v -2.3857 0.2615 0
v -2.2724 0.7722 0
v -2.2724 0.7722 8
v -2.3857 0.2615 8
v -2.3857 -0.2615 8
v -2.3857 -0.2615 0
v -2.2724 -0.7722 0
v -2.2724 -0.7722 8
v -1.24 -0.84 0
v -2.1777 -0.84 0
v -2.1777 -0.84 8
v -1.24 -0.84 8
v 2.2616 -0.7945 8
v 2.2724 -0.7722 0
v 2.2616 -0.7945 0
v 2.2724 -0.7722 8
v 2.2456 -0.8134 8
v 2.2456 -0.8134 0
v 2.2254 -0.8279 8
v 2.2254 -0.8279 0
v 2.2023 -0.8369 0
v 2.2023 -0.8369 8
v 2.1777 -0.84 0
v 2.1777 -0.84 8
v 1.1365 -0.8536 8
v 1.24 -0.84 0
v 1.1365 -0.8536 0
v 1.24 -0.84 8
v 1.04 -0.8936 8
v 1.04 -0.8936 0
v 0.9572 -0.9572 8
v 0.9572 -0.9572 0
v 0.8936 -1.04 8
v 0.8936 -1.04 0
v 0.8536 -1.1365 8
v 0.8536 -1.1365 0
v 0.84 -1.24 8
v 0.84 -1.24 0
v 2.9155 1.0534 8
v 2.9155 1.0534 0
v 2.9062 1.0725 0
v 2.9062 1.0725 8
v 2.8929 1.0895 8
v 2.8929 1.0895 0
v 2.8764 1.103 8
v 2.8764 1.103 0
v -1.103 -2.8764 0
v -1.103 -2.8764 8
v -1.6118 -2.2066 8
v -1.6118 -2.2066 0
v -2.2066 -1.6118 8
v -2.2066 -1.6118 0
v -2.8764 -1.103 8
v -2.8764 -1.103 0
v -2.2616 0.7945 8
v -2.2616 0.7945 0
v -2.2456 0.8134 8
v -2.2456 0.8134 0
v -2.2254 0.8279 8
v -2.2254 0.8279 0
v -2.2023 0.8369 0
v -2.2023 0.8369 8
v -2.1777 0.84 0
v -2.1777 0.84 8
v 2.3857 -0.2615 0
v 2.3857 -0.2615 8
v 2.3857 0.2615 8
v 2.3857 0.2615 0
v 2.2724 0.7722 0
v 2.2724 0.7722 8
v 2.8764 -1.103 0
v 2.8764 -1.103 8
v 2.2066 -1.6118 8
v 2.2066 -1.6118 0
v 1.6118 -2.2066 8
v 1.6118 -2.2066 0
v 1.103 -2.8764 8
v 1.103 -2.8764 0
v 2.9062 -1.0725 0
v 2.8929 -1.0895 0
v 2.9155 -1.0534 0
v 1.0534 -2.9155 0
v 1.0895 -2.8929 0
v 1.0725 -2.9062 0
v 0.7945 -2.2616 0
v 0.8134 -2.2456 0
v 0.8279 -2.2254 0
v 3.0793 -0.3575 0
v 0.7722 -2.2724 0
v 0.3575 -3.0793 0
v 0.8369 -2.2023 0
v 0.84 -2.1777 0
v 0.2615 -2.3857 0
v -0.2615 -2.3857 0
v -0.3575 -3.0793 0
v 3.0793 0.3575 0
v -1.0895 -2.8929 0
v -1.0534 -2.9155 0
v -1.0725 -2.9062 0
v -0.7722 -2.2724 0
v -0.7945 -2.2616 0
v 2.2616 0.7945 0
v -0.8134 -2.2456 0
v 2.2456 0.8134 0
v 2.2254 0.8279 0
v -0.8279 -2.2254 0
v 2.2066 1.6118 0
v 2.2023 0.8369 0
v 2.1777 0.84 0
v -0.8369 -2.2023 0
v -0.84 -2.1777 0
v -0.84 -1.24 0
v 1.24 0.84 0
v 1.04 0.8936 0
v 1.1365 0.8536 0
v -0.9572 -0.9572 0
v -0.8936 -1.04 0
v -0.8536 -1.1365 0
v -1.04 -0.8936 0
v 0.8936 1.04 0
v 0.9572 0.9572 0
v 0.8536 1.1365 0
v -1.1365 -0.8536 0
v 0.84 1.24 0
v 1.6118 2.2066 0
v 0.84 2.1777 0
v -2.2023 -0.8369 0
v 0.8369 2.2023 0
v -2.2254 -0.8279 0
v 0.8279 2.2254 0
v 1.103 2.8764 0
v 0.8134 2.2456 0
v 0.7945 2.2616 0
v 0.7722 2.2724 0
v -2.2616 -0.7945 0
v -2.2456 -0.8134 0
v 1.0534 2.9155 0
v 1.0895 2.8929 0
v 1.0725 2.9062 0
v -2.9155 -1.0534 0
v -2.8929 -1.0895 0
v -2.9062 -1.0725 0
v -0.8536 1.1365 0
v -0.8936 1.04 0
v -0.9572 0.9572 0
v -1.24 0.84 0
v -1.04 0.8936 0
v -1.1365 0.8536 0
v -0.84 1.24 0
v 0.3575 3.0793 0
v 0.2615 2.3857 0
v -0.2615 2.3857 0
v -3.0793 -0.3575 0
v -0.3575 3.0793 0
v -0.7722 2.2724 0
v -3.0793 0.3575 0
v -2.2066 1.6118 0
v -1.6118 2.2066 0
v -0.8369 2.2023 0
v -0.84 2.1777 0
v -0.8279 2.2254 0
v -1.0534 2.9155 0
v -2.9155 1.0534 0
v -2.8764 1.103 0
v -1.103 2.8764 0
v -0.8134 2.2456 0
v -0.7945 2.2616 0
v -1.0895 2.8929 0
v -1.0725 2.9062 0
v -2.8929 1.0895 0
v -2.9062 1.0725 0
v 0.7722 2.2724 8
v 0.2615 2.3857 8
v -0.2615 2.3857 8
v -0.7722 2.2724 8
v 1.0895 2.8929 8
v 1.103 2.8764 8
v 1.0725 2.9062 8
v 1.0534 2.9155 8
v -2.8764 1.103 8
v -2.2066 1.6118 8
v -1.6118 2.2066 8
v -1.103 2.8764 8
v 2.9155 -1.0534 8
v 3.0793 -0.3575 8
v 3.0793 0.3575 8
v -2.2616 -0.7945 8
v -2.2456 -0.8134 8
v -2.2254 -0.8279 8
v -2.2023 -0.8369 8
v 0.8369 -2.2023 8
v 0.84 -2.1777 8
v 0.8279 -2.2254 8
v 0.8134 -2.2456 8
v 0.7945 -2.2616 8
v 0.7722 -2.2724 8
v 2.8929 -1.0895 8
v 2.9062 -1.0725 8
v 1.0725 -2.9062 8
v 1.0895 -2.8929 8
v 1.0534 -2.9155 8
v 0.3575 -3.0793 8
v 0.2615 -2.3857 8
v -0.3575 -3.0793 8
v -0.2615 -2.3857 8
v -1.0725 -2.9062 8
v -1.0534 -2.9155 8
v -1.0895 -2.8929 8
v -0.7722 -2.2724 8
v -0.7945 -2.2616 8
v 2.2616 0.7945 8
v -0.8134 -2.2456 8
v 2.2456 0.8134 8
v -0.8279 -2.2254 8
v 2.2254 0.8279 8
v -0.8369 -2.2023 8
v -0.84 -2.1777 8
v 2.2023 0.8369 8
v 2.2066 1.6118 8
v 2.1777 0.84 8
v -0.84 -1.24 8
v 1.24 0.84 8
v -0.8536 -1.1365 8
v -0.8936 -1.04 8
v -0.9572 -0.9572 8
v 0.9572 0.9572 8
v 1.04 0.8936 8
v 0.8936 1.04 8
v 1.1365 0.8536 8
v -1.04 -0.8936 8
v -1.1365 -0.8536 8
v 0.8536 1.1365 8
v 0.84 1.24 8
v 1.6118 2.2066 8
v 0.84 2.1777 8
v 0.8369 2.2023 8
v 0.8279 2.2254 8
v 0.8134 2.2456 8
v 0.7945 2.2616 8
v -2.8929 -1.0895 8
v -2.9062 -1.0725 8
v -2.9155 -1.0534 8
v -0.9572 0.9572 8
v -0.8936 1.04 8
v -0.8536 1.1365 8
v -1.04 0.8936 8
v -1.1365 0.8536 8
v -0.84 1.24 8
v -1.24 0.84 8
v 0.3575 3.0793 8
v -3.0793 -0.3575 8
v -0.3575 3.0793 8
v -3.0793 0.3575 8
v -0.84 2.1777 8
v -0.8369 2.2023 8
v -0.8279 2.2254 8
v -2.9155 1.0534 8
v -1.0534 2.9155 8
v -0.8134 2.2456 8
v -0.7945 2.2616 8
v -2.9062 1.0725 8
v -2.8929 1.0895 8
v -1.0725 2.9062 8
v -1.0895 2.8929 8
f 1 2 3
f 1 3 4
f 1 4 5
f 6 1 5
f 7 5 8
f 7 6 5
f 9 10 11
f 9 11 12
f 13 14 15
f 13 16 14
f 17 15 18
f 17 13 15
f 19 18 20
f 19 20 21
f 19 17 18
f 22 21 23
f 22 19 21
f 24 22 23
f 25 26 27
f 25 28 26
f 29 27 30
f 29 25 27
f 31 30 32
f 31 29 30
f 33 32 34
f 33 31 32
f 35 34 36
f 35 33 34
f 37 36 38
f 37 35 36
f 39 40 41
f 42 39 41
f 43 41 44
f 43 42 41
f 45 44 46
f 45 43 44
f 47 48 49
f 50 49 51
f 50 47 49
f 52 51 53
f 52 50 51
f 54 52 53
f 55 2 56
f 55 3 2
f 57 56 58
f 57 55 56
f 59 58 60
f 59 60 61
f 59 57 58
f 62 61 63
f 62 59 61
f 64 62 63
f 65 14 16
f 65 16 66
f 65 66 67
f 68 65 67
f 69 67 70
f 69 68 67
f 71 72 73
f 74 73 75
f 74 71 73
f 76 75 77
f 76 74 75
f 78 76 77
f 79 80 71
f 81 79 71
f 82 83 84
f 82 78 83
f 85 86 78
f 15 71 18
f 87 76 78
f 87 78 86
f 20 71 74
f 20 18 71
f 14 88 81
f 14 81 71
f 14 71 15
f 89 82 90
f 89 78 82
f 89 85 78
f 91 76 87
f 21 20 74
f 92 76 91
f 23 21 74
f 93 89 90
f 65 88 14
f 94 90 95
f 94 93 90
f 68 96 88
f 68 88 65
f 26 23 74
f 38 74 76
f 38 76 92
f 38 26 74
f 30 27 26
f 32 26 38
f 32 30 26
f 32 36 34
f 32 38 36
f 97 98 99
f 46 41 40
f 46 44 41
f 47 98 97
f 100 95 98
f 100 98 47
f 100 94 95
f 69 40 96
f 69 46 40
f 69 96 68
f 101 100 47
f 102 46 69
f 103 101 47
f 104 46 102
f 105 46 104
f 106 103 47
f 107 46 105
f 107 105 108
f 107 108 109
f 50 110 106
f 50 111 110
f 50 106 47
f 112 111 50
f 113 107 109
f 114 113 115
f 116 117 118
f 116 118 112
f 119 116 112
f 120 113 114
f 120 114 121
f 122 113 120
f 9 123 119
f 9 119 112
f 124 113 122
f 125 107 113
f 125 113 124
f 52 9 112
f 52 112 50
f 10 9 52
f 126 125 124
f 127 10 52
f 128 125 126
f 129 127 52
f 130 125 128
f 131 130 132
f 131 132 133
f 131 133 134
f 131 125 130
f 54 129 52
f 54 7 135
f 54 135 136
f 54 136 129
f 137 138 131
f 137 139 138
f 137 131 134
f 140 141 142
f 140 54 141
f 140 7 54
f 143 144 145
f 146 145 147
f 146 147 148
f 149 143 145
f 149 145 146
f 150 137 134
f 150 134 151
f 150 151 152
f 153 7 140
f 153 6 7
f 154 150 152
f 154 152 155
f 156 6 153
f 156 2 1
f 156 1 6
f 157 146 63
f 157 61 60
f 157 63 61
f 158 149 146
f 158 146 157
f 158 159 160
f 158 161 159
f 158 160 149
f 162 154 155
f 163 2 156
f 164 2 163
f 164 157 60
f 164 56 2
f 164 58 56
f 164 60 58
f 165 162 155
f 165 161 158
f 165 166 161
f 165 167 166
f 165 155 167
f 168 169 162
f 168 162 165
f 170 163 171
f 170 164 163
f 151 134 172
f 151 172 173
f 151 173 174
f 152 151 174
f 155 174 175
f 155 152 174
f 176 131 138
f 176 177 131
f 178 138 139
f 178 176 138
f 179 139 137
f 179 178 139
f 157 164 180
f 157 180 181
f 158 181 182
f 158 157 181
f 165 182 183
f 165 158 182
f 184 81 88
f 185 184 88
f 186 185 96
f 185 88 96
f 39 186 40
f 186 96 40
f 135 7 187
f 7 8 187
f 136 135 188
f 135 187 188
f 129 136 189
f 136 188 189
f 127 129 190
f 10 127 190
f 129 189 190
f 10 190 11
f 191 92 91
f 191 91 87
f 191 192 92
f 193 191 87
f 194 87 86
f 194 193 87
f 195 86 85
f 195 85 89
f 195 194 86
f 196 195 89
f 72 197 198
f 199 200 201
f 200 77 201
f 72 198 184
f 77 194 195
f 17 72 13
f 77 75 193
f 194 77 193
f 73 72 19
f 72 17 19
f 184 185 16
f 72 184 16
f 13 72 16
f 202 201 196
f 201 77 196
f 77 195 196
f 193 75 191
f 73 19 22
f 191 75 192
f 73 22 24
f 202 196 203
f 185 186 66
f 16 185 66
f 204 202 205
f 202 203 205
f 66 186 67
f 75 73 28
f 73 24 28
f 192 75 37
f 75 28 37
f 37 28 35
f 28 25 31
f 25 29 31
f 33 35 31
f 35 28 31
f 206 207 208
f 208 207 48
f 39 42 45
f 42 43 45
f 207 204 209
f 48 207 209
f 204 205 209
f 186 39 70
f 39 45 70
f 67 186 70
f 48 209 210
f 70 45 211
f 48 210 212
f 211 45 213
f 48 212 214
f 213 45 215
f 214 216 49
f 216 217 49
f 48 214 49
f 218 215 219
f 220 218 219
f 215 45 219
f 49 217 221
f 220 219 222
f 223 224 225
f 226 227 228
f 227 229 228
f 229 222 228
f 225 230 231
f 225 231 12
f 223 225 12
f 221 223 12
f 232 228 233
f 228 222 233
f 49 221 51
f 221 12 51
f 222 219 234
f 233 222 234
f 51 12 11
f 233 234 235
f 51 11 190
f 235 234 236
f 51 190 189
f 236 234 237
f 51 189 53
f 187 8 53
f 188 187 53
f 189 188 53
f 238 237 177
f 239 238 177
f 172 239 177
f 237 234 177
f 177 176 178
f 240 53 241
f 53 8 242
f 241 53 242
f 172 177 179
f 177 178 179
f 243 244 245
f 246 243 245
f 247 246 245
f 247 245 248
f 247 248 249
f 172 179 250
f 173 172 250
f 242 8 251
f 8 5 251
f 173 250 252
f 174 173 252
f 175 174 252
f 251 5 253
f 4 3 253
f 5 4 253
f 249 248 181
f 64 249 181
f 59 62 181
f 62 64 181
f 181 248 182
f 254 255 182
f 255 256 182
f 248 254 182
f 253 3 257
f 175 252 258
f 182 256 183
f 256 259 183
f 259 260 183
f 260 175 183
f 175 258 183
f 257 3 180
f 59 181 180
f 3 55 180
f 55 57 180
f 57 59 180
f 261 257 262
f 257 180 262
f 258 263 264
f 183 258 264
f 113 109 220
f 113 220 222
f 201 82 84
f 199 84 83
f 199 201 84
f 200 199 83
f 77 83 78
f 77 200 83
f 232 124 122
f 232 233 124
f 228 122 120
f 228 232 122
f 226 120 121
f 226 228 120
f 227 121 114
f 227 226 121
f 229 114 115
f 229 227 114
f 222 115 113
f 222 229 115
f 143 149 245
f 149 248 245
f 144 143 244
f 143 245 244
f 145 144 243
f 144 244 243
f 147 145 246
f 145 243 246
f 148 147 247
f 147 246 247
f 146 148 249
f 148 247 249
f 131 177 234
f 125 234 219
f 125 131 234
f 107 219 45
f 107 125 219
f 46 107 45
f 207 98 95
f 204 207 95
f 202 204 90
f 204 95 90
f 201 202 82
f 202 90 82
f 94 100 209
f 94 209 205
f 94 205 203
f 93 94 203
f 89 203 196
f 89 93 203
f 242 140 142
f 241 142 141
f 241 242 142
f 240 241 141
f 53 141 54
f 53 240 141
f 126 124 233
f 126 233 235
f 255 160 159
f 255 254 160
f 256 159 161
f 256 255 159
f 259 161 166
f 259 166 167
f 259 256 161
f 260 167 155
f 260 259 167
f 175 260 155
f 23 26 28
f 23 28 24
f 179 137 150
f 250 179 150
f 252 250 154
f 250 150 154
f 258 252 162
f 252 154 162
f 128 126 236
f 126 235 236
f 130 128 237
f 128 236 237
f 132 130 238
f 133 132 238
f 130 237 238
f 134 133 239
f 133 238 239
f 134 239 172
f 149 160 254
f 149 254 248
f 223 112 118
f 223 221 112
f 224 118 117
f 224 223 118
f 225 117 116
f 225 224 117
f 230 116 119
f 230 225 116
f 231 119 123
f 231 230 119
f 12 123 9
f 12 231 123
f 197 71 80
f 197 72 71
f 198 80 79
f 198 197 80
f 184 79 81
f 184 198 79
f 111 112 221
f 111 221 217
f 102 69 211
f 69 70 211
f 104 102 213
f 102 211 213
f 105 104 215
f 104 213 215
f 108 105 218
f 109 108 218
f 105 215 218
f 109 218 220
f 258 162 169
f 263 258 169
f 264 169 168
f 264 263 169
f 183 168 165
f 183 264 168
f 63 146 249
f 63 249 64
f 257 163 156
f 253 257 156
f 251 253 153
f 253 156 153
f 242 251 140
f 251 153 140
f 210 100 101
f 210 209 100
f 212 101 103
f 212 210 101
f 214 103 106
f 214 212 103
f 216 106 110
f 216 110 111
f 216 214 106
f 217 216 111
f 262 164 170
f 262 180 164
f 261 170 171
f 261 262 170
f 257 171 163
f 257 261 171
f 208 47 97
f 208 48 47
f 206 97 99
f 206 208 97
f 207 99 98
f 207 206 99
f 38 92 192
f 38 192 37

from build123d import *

# Parameters (mm, degrees)
BOSS_EXTRUDE1_DEPTH = 8
CUT_EXTRUDE1_DEPTH  = 8
FILLET1_R           = 0.4
FILLET2_R           = 0.4
FILLET3_R           = 0.4
FILLET4_R           = 0.4
FILLET5_R           = 6.2
FILLET6_R           = 6.2
FILLET7_R           = 6.2
FILLET8_R           = 6.2
FILLET9_R           = 0.1
FILLET10_R          = 0.1
FILLET11_R          = 0.1
FILLET12_R          = 0.1
FILLET13_R          = 0.1
FILLET14_R          = 0.1
FILLET15_R          = 0.1
FILLET16_R          = 0.1
FILLET17_R          = 0.1
FILLET18_R          = 0.1
FILLET19_R          = 0.1
FILLET20_R          = 0.1
FILLET21_R          = 0.1
FILLET22_R          = 0.1
FILLET23_R          = 0.1
FILLET24_R          = 0.1


with BuildPart() as part:
    # Sketch1 → Boss-Extrude1 (new body)
    with BuildSketch(Plane.XY):
        with BuildLine():
            Line((-1.085, -1.085), (-1.085, -2.903924069))
            ThreePointArc((-1.085, -2.903924069), (0, -3.1), (1.085, -2.903924069))
            Line((1.085, -2.903924069), (1.085, -1.085))
            Line((1.085, -1.085), (2.903924069, -1.085))
            ThreePointArc((2.903924069, -1.085), (3.1, 0), (2.903924069, 1.085))
            Line((2.903924069, 1.085), (1.085, 1.085))
            Line((1.085, 1.085), (1.085, 2.903924069))
            ThreePointArc((1.085, 2.903924069), (0, 3.1), (-1.085, 2.903924069))
            Line((-1.085, 2.903924069), (-1.085, 1.085))
            Line((-1.085, 1.085), (-2.903924069, 1.085))
            ThreePointArc((-2.903924069, 1.085), (-3.1, 0), (-2.903924069, -1.085))
            Line((-2.903924069, -1.085), (-1.085, -1.085))
        make_face()
    extrude(amount=BOSS_EXTRUDE1_DEPTH)

    # Sketch2 → Cut-Extrude1 (cut)
    with BuildSketch(Plane.XY):
        with BuildLine():
            Line((0.84, -0.84), (2.248199279, -0.84))
            ThreePointArc((2.248199279, -0.84), (2.4, 0), (2.248199279, 0.84))
            Line((2.248199279, 0.84), (0.84, 0.84))
            Line((0.84, 0.84), (0.84, 2.248199279))
            ThreePointArc((0.84, 2.248199279), (0, 2.4), (-0.84, 2.248199279))
            Line((-0.84, 2.248199279), (-0.84, 0.84))
            Line((-0.84, 0.84), (-2.248199279, 0.84))
            ThreePointArc((-2.248199279, 0.84), (-2.4, 0), (-2.248199279, -0.84))
            Line((-2.248199279, -0.84), (-0.84, -0.84))
            Line((-0.84, -0.84), (-0.84, -2.248199279))
            ThreePointArc((-0.84, -2.248199279), (0, -2.4), (0.84, -2.248199279))
            Line((0.84, -2.248199279), (0.84, -0.84))
        make_face()
    extrude(amount=CUT_EXTRUDE1_DEPTH, mode=Mode.SUBTRACT)

    # Fillet1
    fillet1_edges = [part.edges().sort_by_distance(p)[0] for p in [
        (-0.84, 0.84, 4),
    ]]
    fillet(fillet1_edges, radius=FILLET1_R)

    # Fillet2
    fillet2_edges = [part.edges().sort_by_distance(p)[0] for p in [
        (0.84, 0.84, 4),
    ]]
    fillet(fillet2_edges, radius=FILLET2_R)

    # Fillet3
    fillet3_edges = [part.edges().sort_by_distance(p)[0] for p in [
        (0.84, -0.84, 4),
    ]]
    fillet(fillet3_edges, radius=FILLET3_R)

    # Fillet4
    fillet4_edges = [part.edges().sort_by_distance(p)[0] for p in [
        (-0.84, -0.84, 4),
    ]]
    fillet(fillet4_edges, radius=FILLET4_R)

    # Fillet5
    # the kernel refuses this fillet: 6.2 mm, written as the material it adds along each edge
    with BuildSketch(Plane(origin=(-1.085, 1.085, 0), x_dir=(-1, 0, 0), z_dir=(0, 0, 1))) as fillet5_piece_1:
        with BuildLine():
            CenterArc((5.198154004, -5.198154004), FILLET5_R, 123.027198012, 23.945603977)
            Line((0, -1.818924069), (0, 0))
            Line((0, 0), (1.818924069, 0))
        make_face()
    extrude(amount=8)

    # Fillet6
    # the kernel refuses this fillet: 6.2 mm, written as the material it adds along each edge
    with BuildSketch(Plane(origin=(-1.085, -1.085, 0), x_dir=(-1, 0, 0), z_dir=(0, 0, 1))) as fillet6_piece_1:
        with BuildLine():
            CenterArc((5.198154004, 5.198154004), FILLET6_R, 213.027198012, 23.945603977)
            Line((0, 1.818924069), (0, 0))
            Line((0, 0), (1.818924069, 0))
        make_face()
    extrude(amount=8)

    # Fillet7
    # the kernel refuses this fillet: 6.2 mm, written as the material it adds along each edge
    with BuildSketch(Plane(origin=(1.085, -1.085, 0), x_dir=(0, -1, 0), z_dir=(0, 0, 1))) as fillet7_piece_1:
        with BuildLine():
            CenterArc((5.198154004, 5.198154004), FILLET7_R, 213.027198012, 23.945603977)
            Line((0, 1.818924069), (0, 0))
            Line((0, 0), (1.818924069, 0))
        make_face()
    extrude(amount=8)

    # Fillet8
    # the kernel refuses this fillet: 6.2 mm, written as the material it adds along each edge
    with BuildSketch(Plane(origin=(1.085, 1.085, 0), x_dir=(1, 0, 0), z_dir=(0, 0, 1))) as fillet8_piece_1:
        with BuildLine():
            CenterArc((5.198154004, 5.198154004), FILLET8_R, 213.027198012, 23.945603977)
            Line((0, 1.818924069), (0, 0))
            Line((0, 0), (1.818924069, 0))
        make_face()
    extrude(amount=8)

    # Fillet9
    fillet9_edges = [part.edges().sort_by_distance(p)[0] for p in [
        (0.84, 2.248199279, 4),
    ]]
    fillet(fillet9_edges, radius=FILLET9_R)

    # Fillet10
    fillet10_edges = [part.edges().sort_by_distance(p)[0] for p in [
        (1.085, 2.903924069, 4),
    ]]
    fillet(fillet10_edges, radius=FILLET10_R)

    # Fillet11
    fillet11_edges = [part.edges().sort_by_distance(p)[0] for p in [
        (-1.085, 2.903924069, 4),
    ]]
    fillet(fillet11_edges, radius=FILLET11_R)

    # Fillet12
    fillet12_edges = [part.edges().sort_by_distance(p)[0] for p in [
        (-2.903924069, 1.085, 4),
    ]]
    fillet(fillet12_edges, radius=FILLET12_R)

    # Fillet13
    fillet13_edges = [part.edges().sort_by_distance(p)[0] for p in [
        (-2.903924069, -1.085, 4),
    ]]
    fillet(fillet13_edges, radius=FILLET13_R)

    # Fillet14
    fillet14_edges = [part.edges().sort_by_distance(p)[0] for p in [
        (-1.085, -2.903924069, 4),
    ]]
    fillet(fillet14_edges, radius=FILLET14_R)

    # Fillet15
    fillet15_edges = [part.edges().sort_by_distance(p)[0] for p in [
        (1.085, -2.903924069, 4),
    ]]
    fillet(fillet15_edges, radius=FILLET15_R)

    # Fillet16
    fillet16_edges = [part.edges().sort_by_distance(p)[0] for p in [
        (2.903924069, -1.085, 4),
    ]]
    fillet(fillet16_edges, radius=FILLET16_R)

    # Fillet17
    fillet17_edges = [part.edges().sort_by_distance(p)[0] for p in [
        (2.903924069, 1.085, 4),
    ]]
    fillet(fillet17_edges, radius=FILLET17_R)

    # Fillet18
    fillet18_edges = [part.edges().sort_by_distance(p)[0] for p in [
        (0.84, -2.248199279, 4),
    ]]
    fillet(fillet18_edges, radius=FILLET18_R)

    # Fillet19
    fillet19_edges = [part.edges().sort_by_distance(p)[0] for p in [
        (-0.84, -2.248199279, 4),
    ]]
    fillet(fillet19_edges, radius=FILLET19_R)

    # Fillet20
    fillet20_edges = [part.edges().sort_by_distance(p)[0] for p in [
        (-2.248199279, 0.84, 4),
    ]]
    fillet(fillet20_edges, radius=FILLET20_R)

    # Fillet21
    fillet21_edges = [part.edges().sort_by_distance(p)[0] for p in [
        (-2.248199279, -0.84, 4),
    ]]
    fillet(fillet21_edges, radius=FILLET21_R)

    # Fillet22
    fillet22_edges = [part.edges().sort_by_distance(p)[0] for p in [
        (-0.84, 2.248199279, 4),
    ]]
    fillet(fillet22_edges, radius=FILLET22_R)

    # Fillet23
    fillet23_edges = [part.edges().sort_by_distance(p)[0] for p in [
        (2.248199279, -0.84, 4),
    ]]
    fillet(fillet23_edges, radius=FILLET23_R)

    # Fillet24
    fillet24_edges = [part.edges().sort_by_distance(p)[0] for p in [
        (2.248199279, 0.84, 4),
    ]]
    fillet(fillet24_edges, radius=FILLET24_R)


solid = part.part
